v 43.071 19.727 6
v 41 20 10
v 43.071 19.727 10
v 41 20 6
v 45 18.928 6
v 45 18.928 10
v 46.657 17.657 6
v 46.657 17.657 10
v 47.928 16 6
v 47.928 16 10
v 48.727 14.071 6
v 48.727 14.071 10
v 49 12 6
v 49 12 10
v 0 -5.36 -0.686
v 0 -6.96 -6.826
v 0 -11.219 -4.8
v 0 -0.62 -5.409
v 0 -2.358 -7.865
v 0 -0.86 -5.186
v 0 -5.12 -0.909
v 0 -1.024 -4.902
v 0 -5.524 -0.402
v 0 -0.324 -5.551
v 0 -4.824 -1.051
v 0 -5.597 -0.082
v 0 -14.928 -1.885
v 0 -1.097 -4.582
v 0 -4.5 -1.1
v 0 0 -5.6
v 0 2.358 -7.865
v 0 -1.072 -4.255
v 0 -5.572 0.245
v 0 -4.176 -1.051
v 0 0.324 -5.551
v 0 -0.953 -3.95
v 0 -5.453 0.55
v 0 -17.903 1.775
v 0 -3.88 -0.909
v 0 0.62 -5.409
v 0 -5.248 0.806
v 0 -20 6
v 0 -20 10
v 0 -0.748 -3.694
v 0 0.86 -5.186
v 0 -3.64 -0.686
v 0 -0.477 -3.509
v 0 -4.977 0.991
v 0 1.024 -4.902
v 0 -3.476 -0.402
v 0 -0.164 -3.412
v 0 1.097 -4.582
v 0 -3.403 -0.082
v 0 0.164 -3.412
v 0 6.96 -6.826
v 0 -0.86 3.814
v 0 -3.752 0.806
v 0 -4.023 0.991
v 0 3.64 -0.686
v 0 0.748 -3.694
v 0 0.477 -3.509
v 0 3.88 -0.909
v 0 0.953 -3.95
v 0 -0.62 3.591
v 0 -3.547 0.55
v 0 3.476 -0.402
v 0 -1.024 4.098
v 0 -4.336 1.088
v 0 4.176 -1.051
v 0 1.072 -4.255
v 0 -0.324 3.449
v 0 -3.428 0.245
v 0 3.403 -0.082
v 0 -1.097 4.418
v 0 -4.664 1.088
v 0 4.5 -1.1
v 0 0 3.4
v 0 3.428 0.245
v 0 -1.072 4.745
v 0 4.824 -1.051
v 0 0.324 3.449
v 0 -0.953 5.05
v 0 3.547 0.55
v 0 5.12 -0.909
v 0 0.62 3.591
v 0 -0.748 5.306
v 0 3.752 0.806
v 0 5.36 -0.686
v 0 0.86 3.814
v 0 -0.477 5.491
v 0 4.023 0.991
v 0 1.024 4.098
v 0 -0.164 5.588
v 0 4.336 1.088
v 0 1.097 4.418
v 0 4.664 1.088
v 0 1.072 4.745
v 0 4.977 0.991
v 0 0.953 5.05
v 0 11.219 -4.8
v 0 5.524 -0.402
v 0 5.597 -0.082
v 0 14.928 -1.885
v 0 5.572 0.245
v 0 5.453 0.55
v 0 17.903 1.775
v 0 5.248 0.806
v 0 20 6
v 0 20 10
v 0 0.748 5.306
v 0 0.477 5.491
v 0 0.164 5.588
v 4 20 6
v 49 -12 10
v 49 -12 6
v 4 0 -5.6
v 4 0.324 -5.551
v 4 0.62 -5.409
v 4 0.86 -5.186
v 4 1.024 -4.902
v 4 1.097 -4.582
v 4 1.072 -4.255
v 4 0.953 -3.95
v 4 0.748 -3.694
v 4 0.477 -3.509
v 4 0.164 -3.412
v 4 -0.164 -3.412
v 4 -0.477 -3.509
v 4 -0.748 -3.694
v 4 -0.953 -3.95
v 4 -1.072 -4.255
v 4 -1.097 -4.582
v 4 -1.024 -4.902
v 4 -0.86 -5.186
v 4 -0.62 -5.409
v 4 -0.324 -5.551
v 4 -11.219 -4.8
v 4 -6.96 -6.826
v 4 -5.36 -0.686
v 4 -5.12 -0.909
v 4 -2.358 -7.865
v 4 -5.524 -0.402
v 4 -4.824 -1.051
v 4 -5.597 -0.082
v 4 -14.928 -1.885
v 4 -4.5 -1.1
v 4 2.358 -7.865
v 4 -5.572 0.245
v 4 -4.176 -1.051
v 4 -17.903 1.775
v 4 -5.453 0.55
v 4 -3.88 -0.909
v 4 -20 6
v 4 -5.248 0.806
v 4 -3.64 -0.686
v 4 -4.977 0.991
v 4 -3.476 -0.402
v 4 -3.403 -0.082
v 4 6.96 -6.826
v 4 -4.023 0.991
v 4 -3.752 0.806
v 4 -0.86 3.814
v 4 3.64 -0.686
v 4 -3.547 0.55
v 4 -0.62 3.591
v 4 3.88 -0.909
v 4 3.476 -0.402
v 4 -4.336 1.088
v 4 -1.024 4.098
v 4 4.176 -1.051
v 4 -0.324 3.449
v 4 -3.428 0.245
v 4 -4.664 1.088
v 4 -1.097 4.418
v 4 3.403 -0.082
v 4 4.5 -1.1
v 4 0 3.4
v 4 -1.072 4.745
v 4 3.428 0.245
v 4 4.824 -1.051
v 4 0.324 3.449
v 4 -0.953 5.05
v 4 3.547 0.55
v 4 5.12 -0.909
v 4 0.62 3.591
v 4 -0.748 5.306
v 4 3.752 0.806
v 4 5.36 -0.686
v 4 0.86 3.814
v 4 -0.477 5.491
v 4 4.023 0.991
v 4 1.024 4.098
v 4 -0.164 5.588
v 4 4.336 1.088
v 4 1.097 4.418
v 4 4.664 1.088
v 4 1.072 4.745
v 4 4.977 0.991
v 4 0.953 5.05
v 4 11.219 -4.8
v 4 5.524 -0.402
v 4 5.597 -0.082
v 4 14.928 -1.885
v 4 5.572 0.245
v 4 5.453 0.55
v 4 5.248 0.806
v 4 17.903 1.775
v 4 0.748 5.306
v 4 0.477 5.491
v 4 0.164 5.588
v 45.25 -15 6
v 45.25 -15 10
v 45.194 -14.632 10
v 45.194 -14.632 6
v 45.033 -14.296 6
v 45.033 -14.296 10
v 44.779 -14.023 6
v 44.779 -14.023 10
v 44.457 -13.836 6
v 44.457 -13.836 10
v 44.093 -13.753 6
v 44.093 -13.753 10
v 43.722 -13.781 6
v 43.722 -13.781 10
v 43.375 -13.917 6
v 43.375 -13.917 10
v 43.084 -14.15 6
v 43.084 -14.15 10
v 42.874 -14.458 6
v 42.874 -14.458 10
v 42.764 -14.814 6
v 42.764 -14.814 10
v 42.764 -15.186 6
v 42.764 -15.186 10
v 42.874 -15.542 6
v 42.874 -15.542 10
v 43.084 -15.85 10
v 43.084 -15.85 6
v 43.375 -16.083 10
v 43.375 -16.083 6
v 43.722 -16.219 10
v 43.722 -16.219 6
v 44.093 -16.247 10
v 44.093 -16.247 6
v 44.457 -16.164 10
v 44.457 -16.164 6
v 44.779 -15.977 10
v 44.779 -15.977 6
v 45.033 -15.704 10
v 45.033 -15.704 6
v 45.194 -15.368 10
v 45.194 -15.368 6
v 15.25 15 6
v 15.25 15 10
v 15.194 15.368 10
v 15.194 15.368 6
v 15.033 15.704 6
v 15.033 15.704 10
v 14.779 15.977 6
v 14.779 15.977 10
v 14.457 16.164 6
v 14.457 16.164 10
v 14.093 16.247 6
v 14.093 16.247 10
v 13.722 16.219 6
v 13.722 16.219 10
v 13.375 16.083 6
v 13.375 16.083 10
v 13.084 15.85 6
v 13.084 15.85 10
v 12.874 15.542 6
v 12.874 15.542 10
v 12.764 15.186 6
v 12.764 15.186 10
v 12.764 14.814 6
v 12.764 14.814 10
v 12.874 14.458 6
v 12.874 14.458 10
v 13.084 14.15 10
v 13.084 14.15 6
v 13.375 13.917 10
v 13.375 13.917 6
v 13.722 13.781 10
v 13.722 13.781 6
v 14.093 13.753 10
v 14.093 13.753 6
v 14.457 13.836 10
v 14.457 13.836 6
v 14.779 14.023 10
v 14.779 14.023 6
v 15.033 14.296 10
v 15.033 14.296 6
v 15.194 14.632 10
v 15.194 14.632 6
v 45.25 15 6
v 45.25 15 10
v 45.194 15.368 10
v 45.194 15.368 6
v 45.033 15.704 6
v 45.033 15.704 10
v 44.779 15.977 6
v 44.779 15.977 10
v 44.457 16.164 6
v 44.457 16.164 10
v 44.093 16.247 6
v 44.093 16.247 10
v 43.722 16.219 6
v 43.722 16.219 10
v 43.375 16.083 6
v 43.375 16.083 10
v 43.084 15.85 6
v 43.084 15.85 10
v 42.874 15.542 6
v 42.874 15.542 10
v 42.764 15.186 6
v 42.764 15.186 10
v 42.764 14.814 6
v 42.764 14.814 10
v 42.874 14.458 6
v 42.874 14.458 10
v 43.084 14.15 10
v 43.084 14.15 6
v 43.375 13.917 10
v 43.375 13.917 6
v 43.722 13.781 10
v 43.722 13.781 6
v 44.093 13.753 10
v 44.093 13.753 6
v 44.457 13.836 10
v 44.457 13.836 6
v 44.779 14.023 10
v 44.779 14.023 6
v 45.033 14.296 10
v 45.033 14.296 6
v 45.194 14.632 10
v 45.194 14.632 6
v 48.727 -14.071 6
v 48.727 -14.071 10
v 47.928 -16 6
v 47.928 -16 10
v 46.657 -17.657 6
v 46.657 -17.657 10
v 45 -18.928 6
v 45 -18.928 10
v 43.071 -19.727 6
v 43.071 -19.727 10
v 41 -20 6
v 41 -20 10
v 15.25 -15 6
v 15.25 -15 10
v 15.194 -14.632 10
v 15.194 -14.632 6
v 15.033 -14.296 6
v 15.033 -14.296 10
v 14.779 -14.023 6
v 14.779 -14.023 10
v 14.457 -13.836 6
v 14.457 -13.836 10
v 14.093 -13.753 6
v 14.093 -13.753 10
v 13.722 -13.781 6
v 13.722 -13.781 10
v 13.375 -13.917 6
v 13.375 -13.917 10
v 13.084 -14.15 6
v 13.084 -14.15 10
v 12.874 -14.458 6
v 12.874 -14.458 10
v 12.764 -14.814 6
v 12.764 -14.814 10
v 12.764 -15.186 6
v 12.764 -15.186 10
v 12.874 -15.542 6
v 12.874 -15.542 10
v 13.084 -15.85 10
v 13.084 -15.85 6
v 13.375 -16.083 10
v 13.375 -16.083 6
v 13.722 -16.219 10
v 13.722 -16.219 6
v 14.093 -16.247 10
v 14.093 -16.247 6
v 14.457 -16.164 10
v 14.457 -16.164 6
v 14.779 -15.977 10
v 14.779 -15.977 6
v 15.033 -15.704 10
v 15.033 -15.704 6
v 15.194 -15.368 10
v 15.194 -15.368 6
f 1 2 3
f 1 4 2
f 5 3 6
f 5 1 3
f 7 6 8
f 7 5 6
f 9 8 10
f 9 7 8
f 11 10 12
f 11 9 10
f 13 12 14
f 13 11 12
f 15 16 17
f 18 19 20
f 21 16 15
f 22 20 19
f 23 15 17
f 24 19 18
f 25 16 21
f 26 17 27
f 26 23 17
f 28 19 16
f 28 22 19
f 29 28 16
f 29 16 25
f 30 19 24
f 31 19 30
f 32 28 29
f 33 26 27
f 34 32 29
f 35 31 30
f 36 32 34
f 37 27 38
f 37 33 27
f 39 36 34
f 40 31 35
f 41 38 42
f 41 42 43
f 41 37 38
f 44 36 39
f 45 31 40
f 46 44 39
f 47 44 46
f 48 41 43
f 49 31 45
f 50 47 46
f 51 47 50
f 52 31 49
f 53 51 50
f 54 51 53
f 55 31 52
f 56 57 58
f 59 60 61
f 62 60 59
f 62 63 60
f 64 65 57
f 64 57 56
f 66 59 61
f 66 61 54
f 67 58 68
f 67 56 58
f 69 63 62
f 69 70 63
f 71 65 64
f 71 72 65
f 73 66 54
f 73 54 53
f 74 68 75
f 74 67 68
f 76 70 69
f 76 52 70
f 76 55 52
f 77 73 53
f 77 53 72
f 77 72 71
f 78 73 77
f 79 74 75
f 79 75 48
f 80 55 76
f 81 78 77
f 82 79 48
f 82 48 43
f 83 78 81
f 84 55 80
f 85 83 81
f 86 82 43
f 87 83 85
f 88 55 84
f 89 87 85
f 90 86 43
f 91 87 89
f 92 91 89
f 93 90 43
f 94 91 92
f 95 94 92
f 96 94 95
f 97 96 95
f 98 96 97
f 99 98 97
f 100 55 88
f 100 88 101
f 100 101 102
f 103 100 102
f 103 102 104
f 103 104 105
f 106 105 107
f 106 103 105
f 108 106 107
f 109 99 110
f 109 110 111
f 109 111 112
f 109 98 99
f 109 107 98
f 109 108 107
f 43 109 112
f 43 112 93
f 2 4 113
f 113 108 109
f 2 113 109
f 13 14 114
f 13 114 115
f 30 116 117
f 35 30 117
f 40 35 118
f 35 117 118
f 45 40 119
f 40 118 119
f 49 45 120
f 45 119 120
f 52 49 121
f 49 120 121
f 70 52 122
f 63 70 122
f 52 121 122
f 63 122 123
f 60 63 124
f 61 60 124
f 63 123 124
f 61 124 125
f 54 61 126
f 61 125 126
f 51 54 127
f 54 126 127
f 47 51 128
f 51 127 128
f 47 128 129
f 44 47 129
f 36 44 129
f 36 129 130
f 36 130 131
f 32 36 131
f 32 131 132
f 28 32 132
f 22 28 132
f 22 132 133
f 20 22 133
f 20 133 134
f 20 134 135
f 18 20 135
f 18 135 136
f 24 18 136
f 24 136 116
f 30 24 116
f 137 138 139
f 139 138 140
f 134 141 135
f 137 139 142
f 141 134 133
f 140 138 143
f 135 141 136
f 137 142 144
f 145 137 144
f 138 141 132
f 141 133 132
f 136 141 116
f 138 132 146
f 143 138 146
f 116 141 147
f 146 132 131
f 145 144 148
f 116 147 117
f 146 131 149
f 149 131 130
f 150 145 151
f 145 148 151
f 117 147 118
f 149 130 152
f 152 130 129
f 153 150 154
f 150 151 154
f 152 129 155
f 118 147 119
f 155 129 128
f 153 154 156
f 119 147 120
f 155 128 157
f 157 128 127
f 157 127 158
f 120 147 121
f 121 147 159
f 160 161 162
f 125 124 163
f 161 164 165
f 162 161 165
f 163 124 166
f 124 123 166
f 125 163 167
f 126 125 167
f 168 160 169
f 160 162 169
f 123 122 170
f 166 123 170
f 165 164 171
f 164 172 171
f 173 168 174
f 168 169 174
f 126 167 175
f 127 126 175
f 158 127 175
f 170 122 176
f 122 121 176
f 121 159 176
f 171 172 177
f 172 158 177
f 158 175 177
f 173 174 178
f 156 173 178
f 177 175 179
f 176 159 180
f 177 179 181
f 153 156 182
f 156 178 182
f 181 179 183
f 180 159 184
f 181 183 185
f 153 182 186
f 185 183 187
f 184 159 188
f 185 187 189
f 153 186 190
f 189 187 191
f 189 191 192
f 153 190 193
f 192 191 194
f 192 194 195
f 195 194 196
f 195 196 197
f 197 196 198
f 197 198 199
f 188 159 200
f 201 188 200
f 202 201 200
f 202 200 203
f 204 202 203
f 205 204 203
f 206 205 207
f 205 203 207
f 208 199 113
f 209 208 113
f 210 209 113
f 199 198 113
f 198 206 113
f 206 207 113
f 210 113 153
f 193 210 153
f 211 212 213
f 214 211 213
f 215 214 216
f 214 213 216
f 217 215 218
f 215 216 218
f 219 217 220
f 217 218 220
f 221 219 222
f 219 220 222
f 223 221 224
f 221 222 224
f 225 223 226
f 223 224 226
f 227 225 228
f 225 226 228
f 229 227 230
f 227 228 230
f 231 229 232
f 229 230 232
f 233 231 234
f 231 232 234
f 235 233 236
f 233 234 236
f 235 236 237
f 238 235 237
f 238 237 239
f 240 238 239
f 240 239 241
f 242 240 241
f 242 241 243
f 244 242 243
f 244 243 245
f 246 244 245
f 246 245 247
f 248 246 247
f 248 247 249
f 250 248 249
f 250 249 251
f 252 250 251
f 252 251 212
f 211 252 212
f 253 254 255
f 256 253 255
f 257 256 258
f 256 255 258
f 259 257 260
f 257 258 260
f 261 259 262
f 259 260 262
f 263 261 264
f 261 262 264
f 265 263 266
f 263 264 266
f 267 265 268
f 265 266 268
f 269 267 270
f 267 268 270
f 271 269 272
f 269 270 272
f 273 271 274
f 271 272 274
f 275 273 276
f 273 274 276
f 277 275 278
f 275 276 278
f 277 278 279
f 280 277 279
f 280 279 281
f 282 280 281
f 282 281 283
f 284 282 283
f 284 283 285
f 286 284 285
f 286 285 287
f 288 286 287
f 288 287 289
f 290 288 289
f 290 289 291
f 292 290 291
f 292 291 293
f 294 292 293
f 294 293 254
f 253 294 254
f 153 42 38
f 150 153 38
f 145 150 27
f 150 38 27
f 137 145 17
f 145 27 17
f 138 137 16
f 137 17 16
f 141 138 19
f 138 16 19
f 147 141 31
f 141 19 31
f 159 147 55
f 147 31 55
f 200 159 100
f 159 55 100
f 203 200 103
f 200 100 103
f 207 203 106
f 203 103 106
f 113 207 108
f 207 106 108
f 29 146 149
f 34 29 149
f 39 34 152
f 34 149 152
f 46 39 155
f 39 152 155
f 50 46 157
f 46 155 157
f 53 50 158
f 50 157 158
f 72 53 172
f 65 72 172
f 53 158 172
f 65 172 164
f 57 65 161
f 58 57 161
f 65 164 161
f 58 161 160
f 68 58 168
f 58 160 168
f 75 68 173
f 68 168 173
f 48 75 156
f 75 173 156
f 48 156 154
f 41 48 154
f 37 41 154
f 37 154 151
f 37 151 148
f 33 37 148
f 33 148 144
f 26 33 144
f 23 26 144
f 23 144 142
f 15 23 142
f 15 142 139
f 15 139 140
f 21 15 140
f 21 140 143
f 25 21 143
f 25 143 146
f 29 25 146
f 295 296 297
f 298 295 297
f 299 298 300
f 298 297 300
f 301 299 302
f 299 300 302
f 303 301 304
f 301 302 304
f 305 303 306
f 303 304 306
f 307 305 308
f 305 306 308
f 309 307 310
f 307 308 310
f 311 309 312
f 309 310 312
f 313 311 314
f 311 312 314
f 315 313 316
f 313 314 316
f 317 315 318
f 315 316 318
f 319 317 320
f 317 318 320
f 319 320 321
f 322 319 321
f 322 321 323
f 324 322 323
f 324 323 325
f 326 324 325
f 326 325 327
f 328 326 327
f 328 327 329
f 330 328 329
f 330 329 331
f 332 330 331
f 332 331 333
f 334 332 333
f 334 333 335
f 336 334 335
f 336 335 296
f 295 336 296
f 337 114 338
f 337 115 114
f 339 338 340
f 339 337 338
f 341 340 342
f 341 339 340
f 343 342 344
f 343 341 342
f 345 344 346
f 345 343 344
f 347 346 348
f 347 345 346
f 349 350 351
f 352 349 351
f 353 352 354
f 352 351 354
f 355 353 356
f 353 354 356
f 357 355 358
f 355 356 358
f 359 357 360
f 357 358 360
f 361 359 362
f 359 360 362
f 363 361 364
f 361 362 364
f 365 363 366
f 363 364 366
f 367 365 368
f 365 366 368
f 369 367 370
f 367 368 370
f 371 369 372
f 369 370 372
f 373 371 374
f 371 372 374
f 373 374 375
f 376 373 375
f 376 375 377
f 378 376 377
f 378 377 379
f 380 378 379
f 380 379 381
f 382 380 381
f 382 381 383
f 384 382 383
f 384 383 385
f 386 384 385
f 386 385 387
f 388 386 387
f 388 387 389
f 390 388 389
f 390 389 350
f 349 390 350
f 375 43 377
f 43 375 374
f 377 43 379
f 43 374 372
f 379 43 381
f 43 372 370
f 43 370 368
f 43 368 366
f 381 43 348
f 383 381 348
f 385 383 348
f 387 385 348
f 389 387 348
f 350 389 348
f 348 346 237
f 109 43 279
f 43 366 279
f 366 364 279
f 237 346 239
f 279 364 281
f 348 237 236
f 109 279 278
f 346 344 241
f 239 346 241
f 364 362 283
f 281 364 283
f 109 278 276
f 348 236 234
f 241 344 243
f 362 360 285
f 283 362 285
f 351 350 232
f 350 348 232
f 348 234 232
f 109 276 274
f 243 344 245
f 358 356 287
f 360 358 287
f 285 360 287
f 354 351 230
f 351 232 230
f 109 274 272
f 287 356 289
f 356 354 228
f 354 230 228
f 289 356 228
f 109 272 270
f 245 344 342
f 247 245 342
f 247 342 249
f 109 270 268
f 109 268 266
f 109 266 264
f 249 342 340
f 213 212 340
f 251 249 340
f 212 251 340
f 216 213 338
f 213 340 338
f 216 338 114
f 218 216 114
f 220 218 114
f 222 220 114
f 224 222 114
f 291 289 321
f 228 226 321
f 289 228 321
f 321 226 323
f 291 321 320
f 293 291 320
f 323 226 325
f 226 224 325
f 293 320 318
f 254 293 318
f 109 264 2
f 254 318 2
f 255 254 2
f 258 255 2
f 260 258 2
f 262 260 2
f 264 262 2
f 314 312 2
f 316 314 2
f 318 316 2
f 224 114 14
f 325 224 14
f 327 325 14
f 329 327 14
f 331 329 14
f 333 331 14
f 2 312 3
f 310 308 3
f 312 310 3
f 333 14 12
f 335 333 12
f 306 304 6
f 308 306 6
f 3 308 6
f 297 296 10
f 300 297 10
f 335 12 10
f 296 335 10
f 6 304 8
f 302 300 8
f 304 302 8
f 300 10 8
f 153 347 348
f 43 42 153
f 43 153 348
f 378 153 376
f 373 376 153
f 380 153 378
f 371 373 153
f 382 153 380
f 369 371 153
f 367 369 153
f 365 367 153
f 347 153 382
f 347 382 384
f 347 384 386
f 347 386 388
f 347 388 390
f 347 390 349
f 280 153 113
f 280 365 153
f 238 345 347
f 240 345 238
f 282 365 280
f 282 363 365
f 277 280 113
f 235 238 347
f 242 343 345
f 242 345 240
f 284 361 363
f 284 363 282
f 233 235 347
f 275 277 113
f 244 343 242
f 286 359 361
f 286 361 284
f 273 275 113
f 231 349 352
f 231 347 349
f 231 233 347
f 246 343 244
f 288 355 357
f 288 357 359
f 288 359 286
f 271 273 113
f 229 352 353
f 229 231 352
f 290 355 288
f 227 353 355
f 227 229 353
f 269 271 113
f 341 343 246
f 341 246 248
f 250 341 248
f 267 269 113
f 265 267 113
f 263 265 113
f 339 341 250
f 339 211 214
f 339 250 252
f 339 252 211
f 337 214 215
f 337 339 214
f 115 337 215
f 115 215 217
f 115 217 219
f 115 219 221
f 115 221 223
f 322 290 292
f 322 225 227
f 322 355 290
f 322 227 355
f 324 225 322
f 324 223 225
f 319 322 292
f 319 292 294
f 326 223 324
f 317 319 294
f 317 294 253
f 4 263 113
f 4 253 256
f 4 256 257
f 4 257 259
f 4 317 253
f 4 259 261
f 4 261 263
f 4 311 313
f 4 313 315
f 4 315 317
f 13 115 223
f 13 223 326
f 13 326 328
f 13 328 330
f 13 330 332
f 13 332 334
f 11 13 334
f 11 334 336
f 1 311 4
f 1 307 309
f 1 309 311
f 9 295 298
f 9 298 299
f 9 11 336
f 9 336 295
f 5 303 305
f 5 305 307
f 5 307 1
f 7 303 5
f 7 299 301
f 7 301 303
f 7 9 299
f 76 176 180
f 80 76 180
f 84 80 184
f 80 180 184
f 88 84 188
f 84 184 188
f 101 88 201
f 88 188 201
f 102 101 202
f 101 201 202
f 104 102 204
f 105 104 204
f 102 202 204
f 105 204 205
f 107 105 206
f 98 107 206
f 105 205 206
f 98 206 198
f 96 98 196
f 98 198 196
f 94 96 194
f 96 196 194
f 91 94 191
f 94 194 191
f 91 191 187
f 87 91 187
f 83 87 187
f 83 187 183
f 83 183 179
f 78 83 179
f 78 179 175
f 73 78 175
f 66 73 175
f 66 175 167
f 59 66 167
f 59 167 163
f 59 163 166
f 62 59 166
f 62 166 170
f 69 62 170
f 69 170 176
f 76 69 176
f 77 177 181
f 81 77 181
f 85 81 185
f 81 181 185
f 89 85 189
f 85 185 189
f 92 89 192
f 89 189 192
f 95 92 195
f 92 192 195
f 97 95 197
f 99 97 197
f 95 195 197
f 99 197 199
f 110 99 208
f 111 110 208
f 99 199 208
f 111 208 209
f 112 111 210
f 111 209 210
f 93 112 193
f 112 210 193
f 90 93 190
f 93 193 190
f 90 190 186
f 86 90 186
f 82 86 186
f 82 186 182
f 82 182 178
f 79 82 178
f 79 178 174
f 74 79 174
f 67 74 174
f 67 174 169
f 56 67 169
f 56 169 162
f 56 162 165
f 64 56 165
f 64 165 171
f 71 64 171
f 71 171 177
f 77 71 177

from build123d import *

# Parameters (mm, degrees)
SKETCH1_W           = 20
SKETCH1_H           = 20
BOSS_EXTRUDE1_DEPTH = 4
SKETCH2_R           = 1.1
CUT_EXTRUDE1_DEPTH  = 5
SKETCH3_W           = 4
SKETCH3_H           = 40
BOSS_EXTRUDE2_DEPTH = 45
SKETCH4_R           = 1.25
CUT_EXTRUDE2_DEPTH  = 10
SKETCH5_W           = 4
SKETCH5_H           = 10
BOSS_EXTRUDE4_DEPTH = 4
SKETCH6_W           = 16
SKETCH6_H           = 10
BOSS_EXTRUDE5_DEPTH = 4
CUT_EXTRUDE3_DEPTH  = 4
FILLET6_R           = 8


with BuildPart() as part:
    # Sketch1 → Boss-Extrude1 (new body)
    with BuildSketch(Plane(origin=(0, 0, 0), x_dir=(0, 0, -1), z_dir=(1, 0, 0))):
        Rectangle(SKETCH1_W, SKETCH1_H)
    extrude(amount=BOSS_EXTRUDE1_DEPTH)

    # Sketch2 → Cut-Extrude1 (cut, through all)
    with BuildSketch(Plane(origin=(4, 0, 0), x_dir=(0, 0, -1), z_dir=(1, 0, 0))):
        with Locations((-4.5, 0)):
            Circle(SKETCH2_R)
        with Locations((4.5, 0)):
            Circle(SKETCH2_R)
        with Locations((0, 4.5)):
            Circle(SKETCH2_R)
        with Locations((0, -4.5)):
            Circle(SKETCH2_R)
    extrude(amount=-CUT_EXTRUDE1_DEPTH, mode=Mode.SUBTRACT)

    # Sketch3 → Boss-Extrude2 (add)
    with BuildSketch(Plane(origin=(4, 0, 0), x_dir=(0, 0, -1), z_dir=(1, 0, 0))):
        with Locations((-8, 0)):
            Rectangle(SKETCH3_W, SKETCH3_H)
    extrude(amount=BOSS_EXTRUDE2_DEPTH)

    # Sketch4 → Cut-Extrude2 (cut)
    with BuildSketch(Plane.XY.offset(10)):
        with Locations((14, 15)):
            Circle(SKETCH4_R)
        with Locations((14, -15)):
            Circle(SKETCH4_R)
        with Locations((44, 15)):
            Circle(SKETCH4_R)
        with Locations((44, -15)):
            Circle(SKETCH4_R)
    extrude(amount=-CUT_EXTRUDE2_DEPTH, mode=Mode.SUBTRACT)

    # Sketch5 → Boss-Extrude4 (add)
    with BuildSketch(Plane.ZY.offset(-4)):
        with Locations((8, -15)):
            Rectangle(SKETCH5_W, SKETCH5_H)
        with Locations((8, 15)):
            Rectangle(SKETCH5_W, SKETCH5_H)
    extrude(amount=BOSS_EXTRUDE4_DEPTH)

    # Sketch6 → Boss-Extrude5 (add)
    with BuildSketch(Plane.ZY):
        with Locations((-2, 15)):
            Rectangle(SKETCH6_W, SKETCH6_H)
        with Locations((-2, -15)):
            Rectangle(SKETCH6_W, SKETCH6_H)
    extrude(amount=-BOSS_EXTRUDE5_DEPTH)

    # Sketch7 → Cut-Extrude3 (cut)
    with BuildSketch(Plane.ZY):
        with BuildLine():
            Line((-10, -20), (6, -20))
            ThreePointArc((6, -20), (-7.996256634, 0), (6, 20))
            Line((6, 20), (-10, 20))
            Line((-10, 20), (-10, -20))
        make_face()
    extrude(amount=-CUT_EXTRUDE3_DEPTH, mode=Mode.SUBTRACT)

    # Fillet6
    fillet6_edges = [part.edges().sort_by_distance(p)[0] for p in [
        (49, -20, 8),
        (49, 20, 8),
    ]]
    fillet(fillet6_edges, radius=FILLET6_R)


solid = part.part
